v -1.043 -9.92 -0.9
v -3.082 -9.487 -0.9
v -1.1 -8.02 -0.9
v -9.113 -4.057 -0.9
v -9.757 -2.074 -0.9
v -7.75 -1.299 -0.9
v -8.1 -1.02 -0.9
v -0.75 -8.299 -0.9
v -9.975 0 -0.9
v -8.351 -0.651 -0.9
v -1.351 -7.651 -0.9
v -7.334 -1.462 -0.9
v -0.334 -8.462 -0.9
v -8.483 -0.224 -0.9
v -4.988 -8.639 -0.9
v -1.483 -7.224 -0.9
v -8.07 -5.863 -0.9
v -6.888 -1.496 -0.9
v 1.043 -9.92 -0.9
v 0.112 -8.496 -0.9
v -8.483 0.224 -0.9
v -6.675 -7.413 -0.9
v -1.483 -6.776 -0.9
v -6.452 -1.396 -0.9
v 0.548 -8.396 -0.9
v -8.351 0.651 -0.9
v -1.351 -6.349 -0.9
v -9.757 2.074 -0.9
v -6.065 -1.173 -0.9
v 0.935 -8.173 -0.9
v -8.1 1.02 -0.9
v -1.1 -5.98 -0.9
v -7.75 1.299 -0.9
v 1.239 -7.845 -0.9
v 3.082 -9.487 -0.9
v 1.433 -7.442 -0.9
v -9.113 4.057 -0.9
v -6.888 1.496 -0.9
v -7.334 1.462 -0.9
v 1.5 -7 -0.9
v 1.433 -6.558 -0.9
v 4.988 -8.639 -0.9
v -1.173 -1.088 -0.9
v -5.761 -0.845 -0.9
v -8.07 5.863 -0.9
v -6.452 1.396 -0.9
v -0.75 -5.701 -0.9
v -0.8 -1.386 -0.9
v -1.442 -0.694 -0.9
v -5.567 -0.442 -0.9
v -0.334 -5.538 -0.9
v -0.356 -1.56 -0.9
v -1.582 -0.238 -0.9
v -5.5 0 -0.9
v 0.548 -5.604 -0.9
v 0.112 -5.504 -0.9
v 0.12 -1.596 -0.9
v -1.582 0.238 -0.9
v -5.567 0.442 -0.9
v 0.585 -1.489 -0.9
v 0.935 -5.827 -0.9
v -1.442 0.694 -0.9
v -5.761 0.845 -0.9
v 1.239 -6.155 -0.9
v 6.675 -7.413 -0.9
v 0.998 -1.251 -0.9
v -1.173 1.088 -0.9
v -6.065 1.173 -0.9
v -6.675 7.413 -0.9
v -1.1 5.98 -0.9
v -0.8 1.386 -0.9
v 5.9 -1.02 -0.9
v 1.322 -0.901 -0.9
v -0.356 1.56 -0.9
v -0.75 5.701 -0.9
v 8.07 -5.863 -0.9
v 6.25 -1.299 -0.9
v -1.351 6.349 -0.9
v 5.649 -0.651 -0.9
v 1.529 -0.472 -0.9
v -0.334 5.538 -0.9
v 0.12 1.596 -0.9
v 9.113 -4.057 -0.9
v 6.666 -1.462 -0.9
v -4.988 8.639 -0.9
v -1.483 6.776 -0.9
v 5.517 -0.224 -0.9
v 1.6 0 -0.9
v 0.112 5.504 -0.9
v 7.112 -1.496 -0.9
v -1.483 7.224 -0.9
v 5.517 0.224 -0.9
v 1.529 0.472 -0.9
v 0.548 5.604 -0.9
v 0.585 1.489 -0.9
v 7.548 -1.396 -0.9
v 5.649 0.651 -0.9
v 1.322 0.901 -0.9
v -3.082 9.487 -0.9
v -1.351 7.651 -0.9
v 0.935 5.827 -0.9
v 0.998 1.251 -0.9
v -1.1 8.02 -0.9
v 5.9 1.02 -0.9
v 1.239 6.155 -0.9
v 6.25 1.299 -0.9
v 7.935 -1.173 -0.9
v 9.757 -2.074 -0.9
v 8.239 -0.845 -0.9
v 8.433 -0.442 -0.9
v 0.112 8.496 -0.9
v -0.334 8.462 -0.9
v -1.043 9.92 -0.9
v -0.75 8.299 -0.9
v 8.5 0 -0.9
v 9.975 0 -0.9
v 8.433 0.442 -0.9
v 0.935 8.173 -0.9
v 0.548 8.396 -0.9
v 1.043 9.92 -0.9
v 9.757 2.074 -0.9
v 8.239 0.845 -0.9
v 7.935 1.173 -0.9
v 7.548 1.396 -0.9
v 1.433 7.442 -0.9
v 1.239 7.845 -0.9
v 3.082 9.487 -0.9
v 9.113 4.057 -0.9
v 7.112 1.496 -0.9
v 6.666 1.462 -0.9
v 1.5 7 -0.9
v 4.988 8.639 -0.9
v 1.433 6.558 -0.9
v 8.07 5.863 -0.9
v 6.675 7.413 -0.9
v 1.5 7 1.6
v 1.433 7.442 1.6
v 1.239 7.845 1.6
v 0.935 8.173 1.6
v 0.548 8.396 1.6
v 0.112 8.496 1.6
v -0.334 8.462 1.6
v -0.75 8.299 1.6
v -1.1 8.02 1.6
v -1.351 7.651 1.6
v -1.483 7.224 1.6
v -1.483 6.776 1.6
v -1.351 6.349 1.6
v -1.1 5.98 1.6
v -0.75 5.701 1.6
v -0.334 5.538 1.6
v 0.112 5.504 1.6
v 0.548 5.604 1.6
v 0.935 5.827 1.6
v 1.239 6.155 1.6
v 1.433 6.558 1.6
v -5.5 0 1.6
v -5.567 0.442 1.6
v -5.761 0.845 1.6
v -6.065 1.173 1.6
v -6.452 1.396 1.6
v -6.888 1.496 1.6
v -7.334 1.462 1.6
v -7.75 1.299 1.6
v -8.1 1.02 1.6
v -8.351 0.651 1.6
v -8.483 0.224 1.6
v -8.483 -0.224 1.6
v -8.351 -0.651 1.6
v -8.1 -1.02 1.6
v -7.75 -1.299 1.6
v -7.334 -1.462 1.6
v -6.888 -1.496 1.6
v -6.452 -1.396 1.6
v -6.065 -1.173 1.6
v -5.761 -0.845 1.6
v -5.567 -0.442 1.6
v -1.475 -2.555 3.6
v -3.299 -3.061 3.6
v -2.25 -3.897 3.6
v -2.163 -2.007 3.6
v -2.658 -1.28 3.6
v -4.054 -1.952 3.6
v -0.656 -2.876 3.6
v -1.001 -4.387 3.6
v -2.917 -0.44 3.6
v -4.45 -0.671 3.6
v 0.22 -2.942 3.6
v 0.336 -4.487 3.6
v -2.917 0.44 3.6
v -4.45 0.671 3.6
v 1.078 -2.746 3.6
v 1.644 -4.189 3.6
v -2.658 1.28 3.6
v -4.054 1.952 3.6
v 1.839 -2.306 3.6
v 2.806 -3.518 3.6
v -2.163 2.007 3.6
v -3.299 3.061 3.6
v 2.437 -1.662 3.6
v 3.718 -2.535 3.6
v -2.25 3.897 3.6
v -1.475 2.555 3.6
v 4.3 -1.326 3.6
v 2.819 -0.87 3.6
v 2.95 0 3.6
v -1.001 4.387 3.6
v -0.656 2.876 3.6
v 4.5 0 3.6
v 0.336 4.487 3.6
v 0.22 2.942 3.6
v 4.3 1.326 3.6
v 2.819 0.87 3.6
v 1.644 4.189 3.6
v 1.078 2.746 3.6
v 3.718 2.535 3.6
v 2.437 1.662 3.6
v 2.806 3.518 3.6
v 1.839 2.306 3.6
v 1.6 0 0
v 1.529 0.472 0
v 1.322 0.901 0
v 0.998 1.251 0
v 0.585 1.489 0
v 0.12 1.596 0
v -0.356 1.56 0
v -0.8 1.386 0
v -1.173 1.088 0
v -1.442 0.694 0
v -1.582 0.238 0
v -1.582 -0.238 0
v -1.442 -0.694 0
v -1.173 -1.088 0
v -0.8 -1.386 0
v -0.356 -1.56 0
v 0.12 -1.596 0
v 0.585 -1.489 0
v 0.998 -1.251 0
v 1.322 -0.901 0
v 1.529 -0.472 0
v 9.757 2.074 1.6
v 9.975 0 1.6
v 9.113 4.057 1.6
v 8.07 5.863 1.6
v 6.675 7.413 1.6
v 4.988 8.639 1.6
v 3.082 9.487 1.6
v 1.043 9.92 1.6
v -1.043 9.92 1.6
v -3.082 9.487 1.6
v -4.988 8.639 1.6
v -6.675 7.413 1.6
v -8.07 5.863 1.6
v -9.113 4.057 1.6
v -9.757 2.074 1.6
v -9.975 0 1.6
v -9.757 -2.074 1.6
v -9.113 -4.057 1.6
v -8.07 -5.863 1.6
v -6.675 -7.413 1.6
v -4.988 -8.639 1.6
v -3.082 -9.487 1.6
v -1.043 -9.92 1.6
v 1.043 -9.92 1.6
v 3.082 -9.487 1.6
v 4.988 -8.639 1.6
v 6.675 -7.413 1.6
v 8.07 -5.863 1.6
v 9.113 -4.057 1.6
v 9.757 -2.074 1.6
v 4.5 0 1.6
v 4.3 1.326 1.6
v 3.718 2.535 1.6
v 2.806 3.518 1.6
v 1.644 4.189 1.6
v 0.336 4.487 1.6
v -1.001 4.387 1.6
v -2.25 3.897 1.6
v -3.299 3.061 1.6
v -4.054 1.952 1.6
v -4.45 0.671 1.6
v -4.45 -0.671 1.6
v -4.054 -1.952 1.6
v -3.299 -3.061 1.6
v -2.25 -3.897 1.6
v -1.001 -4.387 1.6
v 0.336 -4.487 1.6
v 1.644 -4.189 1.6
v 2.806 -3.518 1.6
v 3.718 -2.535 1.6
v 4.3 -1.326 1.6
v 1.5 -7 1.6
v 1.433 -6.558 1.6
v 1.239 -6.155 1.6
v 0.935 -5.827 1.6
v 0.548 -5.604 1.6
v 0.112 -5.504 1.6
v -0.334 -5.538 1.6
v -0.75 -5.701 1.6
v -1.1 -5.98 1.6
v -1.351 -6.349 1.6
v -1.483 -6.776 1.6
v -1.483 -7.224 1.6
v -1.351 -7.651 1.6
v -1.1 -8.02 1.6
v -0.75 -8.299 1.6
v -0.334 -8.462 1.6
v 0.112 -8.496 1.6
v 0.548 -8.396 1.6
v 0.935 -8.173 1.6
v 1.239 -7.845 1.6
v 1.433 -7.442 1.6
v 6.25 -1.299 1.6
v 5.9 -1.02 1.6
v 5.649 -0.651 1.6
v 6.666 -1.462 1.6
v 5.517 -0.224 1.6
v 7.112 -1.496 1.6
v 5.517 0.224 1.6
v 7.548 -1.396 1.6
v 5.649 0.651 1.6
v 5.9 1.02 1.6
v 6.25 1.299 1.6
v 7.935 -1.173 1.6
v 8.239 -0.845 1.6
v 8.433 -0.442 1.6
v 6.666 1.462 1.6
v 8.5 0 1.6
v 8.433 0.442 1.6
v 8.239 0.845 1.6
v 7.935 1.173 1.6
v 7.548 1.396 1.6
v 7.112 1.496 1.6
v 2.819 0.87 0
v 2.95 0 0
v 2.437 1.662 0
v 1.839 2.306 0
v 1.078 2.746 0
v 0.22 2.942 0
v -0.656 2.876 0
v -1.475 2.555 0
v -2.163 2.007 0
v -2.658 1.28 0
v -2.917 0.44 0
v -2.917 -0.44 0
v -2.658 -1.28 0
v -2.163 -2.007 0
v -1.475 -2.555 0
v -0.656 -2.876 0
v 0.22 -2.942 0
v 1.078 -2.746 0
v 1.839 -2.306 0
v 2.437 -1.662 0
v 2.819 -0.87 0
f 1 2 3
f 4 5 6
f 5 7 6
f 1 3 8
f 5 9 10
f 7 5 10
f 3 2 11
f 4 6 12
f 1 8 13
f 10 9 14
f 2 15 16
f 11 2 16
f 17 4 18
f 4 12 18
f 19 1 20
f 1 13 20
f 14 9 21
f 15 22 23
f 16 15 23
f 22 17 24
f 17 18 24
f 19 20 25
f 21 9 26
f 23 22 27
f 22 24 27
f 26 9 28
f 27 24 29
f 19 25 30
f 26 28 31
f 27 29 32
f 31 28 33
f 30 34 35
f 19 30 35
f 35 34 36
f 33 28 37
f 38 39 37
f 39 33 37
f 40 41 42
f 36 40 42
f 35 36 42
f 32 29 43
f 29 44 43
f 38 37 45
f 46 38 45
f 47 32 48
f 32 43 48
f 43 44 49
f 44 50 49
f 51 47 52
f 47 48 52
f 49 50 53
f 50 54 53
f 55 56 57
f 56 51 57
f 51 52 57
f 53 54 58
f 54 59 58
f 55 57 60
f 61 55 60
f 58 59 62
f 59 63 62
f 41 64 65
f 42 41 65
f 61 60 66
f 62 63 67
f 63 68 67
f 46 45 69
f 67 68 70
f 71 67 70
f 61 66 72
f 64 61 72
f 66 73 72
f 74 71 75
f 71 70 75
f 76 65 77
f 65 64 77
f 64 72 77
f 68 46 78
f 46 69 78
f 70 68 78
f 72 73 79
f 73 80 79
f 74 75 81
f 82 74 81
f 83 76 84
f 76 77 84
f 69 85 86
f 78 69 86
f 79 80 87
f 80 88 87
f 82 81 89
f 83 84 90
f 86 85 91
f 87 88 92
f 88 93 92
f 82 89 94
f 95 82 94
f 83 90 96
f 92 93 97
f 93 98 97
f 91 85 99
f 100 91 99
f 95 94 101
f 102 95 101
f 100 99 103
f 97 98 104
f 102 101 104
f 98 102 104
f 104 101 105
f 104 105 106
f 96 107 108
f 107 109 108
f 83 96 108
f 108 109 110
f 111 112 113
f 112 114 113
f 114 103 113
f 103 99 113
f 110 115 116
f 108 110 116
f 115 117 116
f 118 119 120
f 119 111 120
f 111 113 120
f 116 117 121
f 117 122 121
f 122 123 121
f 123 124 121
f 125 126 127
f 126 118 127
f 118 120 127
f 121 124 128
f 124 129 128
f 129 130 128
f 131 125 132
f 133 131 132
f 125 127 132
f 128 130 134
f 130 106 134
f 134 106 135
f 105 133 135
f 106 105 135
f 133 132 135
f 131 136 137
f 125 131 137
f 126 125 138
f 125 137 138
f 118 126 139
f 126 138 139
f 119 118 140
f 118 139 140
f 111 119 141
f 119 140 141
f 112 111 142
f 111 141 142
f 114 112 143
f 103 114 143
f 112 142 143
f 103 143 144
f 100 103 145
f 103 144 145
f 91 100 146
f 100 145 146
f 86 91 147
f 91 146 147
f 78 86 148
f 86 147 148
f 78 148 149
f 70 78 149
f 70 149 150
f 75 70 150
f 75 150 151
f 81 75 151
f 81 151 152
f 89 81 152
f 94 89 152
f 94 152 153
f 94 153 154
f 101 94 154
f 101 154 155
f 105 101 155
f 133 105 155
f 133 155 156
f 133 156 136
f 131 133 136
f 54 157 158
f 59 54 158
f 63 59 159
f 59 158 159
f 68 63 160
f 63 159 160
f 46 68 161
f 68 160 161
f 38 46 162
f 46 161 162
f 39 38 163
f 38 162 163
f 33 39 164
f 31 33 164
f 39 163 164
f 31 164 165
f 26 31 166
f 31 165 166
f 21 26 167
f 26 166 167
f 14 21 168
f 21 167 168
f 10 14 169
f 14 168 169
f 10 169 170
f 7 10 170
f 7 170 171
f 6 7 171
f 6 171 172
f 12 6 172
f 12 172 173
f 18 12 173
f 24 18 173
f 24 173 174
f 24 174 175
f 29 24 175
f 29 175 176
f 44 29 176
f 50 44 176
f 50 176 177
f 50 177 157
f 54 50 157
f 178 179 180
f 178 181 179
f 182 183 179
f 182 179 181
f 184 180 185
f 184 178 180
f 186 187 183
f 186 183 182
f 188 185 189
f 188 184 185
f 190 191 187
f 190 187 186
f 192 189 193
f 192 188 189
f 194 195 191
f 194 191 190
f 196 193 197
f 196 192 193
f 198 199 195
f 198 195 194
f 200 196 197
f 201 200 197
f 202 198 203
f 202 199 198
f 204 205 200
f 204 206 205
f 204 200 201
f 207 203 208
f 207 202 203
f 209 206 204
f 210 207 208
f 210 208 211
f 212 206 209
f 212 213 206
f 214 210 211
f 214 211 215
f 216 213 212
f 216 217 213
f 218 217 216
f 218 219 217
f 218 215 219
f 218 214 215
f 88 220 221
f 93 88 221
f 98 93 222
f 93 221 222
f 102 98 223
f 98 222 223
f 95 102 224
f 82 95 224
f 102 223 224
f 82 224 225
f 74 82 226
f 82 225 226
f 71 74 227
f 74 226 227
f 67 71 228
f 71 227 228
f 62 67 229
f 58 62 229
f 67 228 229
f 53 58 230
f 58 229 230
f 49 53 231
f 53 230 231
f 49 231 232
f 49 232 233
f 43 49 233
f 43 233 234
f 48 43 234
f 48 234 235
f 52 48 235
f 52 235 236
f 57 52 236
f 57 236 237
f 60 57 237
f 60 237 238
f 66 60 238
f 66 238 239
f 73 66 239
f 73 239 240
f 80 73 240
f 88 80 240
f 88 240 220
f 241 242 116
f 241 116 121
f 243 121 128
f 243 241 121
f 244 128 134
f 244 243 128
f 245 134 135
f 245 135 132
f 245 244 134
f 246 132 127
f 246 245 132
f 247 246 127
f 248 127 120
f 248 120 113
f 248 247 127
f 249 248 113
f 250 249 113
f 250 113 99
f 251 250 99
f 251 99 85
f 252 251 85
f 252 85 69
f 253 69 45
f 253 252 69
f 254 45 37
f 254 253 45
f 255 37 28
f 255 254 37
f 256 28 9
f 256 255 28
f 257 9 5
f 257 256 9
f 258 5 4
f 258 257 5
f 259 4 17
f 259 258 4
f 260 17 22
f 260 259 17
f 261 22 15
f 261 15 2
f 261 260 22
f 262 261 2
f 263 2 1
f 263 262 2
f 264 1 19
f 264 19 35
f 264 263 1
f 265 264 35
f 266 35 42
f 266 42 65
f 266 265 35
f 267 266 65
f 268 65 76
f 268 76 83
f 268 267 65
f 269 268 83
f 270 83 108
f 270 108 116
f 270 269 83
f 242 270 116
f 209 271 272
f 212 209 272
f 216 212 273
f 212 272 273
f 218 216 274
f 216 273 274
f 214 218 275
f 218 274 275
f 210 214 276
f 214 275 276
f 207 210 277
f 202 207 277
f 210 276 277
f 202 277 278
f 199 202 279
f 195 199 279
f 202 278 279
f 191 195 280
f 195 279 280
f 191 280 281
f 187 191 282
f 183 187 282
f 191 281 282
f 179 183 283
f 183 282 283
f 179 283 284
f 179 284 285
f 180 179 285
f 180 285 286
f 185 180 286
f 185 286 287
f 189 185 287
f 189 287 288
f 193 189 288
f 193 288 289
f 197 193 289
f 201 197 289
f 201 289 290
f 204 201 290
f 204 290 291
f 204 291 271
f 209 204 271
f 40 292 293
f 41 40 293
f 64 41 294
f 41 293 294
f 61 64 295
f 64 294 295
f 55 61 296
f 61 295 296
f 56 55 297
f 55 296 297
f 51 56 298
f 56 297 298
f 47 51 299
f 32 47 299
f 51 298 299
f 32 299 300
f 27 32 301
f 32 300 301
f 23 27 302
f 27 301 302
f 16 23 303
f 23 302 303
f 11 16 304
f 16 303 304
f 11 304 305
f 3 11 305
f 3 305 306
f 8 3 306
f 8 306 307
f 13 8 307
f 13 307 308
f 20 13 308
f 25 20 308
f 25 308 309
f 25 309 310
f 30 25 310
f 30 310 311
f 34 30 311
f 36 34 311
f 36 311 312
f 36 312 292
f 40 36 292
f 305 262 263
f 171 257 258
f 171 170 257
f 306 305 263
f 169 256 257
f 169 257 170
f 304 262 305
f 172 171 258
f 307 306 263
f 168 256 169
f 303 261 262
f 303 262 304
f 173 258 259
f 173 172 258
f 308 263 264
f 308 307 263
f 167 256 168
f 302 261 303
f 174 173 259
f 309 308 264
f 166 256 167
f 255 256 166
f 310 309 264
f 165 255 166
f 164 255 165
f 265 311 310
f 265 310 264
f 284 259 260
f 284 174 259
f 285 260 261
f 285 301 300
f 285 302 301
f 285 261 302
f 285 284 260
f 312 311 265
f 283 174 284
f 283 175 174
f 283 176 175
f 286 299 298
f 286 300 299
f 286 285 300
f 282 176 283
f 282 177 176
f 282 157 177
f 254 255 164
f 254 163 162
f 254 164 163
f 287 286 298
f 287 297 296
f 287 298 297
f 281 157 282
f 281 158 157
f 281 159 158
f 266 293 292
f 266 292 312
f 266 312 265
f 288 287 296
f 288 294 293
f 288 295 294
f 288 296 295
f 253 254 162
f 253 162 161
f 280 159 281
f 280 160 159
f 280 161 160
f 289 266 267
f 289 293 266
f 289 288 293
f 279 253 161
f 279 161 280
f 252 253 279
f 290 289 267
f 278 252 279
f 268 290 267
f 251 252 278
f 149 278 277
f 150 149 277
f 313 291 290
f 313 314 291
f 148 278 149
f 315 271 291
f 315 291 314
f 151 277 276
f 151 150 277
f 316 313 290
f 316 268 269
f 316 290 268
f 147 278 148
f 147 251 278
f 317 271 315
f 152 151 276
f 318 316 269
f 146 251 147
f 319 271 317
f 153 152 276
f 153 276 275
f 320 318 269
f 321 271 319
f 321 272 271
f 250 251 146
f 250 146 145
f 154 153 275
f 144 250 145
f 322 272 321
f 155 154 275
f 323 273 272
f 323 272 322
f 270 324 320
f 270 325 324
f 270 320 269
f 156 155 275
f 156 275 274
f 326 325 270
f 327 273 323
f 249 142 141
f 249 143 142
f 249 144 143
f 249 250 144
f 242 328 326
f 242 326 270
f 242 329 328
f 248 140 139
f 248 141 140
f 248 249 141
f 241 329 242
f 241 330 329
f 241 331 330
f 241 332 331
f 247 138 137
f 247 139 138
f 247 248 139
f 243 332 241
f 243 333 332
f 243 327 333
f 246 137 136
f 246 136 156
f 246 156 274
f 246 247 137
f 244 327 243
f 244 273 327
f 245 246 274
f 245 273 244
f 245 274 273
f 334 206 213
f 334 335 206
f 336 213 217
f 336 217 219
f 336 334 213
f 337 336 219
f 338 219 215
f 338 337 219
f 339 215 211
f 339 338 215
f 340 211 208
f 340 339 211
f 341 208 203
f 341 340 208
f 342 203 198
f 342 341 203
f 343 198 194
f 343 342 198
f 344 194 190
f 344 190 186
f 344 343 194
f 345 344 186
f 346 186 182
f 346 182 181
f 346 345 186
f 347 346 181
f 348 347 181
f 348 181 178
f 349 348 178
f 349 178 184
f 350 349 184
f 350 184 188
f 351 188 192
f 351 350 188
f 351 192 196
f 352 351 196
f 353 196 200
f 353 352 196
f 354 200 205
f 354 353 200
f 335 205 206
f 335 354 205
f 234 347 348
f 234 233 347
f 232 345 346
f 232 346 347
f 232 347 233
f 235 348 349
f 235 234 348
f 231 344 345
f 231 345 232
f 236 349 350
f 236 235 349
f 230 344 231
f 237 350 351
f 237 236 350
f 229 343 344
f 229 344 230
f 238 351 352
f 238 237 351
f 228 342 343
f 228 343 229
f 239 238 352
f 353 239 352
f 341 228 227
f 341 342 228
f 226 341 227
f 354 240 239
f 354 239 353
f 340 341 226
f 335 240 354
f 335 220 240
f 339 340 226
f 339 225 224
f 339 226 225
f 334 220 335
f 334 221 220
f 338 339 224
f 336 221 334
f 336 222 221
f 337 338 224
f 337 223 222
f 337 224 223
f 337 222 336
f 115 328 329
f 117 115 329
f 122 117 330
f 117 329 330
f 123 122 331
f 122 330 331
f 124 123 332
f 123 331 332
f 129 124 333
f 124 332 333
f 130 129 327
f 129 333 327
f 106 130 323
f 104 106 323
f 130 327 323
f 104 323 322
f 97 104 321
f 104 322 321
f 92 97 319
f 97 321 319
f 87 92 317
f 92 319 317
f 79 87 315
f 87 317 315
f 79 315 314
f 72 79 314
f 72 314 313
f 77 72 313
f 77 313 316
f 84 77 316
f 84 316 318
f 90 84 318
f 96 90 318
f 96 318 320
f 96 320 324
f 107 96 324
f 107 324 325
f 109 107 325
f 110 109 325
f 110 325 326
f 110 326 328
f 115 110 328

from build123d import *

# Parameters (mm, degrees)
SKETCH1_R                 = 4.5
SKETCH1_R_2               = 2.95
BOSS_EXTRUDE2_DEPTH       = 3.6
BOSS_EXTRUDE3_START       = 1.6
SKETCH1_4_R               = 9.975
SKETCH1_4_R_2             = 1.6
BOSS_EXTRUDE3_DEPTH       = 2.5
SKETCH1_6_R               = 2.95
CUT_EXTRUDE1_DEPTH        = 1.6
M3X0_5_TAPPED_HOLE1_D     = 3
M3X0_5_TAPPED_HOLE1_DEPTH = 2.5


with BuildPart() as part:
    # Sketch1 → Boss-Extrude2 (new body)
    with BuildSketch(Plane.XY):
        Circle(SKETCH1_R)
        Circle(SKETCH1_R_2, mode=Mode.SUBTRACT)
    extrude(amount=BOSS_EXTRUDE2_DEPTH)

    # Sketch1<4> → Boss-Extrude3 (add)
    with BuildSketch(Plane.XY.offset(BOSS_EXTRUDE3_START)):
        Circle(SKETCH1_4_R)
        Circle(SKETCH1_4_R_2, mode=Mode.SUBTRACT)
    extrude(amount=-BOSS_EXTRUDE3_DEPTH)

    # Sketch1<6> → Cut-Extrude1 (cut)
    with BuildSketch(Plane.XY):
        Circle(SKETCH1_6_R)
    extrude(amount=CUT_EXTRUDE1_DEPTH, mode=Mode.SUBTRACT)

    # M3x0.5 Tapped Hole1
    with Locations(Plane(origin=(0, 0, -0.9), x_dir=(-1, 0, 0), z_dir=(0, 0, -1))):
        with Locations((0, 7), (7, 0), (0, -7), (-7, 0)):
            Hole(M3X0_5_TAPPED_HOLE1_D / 2, depth=M3X0_5_TAPPED_HOLE1_DEPTH)


solid = part.part
